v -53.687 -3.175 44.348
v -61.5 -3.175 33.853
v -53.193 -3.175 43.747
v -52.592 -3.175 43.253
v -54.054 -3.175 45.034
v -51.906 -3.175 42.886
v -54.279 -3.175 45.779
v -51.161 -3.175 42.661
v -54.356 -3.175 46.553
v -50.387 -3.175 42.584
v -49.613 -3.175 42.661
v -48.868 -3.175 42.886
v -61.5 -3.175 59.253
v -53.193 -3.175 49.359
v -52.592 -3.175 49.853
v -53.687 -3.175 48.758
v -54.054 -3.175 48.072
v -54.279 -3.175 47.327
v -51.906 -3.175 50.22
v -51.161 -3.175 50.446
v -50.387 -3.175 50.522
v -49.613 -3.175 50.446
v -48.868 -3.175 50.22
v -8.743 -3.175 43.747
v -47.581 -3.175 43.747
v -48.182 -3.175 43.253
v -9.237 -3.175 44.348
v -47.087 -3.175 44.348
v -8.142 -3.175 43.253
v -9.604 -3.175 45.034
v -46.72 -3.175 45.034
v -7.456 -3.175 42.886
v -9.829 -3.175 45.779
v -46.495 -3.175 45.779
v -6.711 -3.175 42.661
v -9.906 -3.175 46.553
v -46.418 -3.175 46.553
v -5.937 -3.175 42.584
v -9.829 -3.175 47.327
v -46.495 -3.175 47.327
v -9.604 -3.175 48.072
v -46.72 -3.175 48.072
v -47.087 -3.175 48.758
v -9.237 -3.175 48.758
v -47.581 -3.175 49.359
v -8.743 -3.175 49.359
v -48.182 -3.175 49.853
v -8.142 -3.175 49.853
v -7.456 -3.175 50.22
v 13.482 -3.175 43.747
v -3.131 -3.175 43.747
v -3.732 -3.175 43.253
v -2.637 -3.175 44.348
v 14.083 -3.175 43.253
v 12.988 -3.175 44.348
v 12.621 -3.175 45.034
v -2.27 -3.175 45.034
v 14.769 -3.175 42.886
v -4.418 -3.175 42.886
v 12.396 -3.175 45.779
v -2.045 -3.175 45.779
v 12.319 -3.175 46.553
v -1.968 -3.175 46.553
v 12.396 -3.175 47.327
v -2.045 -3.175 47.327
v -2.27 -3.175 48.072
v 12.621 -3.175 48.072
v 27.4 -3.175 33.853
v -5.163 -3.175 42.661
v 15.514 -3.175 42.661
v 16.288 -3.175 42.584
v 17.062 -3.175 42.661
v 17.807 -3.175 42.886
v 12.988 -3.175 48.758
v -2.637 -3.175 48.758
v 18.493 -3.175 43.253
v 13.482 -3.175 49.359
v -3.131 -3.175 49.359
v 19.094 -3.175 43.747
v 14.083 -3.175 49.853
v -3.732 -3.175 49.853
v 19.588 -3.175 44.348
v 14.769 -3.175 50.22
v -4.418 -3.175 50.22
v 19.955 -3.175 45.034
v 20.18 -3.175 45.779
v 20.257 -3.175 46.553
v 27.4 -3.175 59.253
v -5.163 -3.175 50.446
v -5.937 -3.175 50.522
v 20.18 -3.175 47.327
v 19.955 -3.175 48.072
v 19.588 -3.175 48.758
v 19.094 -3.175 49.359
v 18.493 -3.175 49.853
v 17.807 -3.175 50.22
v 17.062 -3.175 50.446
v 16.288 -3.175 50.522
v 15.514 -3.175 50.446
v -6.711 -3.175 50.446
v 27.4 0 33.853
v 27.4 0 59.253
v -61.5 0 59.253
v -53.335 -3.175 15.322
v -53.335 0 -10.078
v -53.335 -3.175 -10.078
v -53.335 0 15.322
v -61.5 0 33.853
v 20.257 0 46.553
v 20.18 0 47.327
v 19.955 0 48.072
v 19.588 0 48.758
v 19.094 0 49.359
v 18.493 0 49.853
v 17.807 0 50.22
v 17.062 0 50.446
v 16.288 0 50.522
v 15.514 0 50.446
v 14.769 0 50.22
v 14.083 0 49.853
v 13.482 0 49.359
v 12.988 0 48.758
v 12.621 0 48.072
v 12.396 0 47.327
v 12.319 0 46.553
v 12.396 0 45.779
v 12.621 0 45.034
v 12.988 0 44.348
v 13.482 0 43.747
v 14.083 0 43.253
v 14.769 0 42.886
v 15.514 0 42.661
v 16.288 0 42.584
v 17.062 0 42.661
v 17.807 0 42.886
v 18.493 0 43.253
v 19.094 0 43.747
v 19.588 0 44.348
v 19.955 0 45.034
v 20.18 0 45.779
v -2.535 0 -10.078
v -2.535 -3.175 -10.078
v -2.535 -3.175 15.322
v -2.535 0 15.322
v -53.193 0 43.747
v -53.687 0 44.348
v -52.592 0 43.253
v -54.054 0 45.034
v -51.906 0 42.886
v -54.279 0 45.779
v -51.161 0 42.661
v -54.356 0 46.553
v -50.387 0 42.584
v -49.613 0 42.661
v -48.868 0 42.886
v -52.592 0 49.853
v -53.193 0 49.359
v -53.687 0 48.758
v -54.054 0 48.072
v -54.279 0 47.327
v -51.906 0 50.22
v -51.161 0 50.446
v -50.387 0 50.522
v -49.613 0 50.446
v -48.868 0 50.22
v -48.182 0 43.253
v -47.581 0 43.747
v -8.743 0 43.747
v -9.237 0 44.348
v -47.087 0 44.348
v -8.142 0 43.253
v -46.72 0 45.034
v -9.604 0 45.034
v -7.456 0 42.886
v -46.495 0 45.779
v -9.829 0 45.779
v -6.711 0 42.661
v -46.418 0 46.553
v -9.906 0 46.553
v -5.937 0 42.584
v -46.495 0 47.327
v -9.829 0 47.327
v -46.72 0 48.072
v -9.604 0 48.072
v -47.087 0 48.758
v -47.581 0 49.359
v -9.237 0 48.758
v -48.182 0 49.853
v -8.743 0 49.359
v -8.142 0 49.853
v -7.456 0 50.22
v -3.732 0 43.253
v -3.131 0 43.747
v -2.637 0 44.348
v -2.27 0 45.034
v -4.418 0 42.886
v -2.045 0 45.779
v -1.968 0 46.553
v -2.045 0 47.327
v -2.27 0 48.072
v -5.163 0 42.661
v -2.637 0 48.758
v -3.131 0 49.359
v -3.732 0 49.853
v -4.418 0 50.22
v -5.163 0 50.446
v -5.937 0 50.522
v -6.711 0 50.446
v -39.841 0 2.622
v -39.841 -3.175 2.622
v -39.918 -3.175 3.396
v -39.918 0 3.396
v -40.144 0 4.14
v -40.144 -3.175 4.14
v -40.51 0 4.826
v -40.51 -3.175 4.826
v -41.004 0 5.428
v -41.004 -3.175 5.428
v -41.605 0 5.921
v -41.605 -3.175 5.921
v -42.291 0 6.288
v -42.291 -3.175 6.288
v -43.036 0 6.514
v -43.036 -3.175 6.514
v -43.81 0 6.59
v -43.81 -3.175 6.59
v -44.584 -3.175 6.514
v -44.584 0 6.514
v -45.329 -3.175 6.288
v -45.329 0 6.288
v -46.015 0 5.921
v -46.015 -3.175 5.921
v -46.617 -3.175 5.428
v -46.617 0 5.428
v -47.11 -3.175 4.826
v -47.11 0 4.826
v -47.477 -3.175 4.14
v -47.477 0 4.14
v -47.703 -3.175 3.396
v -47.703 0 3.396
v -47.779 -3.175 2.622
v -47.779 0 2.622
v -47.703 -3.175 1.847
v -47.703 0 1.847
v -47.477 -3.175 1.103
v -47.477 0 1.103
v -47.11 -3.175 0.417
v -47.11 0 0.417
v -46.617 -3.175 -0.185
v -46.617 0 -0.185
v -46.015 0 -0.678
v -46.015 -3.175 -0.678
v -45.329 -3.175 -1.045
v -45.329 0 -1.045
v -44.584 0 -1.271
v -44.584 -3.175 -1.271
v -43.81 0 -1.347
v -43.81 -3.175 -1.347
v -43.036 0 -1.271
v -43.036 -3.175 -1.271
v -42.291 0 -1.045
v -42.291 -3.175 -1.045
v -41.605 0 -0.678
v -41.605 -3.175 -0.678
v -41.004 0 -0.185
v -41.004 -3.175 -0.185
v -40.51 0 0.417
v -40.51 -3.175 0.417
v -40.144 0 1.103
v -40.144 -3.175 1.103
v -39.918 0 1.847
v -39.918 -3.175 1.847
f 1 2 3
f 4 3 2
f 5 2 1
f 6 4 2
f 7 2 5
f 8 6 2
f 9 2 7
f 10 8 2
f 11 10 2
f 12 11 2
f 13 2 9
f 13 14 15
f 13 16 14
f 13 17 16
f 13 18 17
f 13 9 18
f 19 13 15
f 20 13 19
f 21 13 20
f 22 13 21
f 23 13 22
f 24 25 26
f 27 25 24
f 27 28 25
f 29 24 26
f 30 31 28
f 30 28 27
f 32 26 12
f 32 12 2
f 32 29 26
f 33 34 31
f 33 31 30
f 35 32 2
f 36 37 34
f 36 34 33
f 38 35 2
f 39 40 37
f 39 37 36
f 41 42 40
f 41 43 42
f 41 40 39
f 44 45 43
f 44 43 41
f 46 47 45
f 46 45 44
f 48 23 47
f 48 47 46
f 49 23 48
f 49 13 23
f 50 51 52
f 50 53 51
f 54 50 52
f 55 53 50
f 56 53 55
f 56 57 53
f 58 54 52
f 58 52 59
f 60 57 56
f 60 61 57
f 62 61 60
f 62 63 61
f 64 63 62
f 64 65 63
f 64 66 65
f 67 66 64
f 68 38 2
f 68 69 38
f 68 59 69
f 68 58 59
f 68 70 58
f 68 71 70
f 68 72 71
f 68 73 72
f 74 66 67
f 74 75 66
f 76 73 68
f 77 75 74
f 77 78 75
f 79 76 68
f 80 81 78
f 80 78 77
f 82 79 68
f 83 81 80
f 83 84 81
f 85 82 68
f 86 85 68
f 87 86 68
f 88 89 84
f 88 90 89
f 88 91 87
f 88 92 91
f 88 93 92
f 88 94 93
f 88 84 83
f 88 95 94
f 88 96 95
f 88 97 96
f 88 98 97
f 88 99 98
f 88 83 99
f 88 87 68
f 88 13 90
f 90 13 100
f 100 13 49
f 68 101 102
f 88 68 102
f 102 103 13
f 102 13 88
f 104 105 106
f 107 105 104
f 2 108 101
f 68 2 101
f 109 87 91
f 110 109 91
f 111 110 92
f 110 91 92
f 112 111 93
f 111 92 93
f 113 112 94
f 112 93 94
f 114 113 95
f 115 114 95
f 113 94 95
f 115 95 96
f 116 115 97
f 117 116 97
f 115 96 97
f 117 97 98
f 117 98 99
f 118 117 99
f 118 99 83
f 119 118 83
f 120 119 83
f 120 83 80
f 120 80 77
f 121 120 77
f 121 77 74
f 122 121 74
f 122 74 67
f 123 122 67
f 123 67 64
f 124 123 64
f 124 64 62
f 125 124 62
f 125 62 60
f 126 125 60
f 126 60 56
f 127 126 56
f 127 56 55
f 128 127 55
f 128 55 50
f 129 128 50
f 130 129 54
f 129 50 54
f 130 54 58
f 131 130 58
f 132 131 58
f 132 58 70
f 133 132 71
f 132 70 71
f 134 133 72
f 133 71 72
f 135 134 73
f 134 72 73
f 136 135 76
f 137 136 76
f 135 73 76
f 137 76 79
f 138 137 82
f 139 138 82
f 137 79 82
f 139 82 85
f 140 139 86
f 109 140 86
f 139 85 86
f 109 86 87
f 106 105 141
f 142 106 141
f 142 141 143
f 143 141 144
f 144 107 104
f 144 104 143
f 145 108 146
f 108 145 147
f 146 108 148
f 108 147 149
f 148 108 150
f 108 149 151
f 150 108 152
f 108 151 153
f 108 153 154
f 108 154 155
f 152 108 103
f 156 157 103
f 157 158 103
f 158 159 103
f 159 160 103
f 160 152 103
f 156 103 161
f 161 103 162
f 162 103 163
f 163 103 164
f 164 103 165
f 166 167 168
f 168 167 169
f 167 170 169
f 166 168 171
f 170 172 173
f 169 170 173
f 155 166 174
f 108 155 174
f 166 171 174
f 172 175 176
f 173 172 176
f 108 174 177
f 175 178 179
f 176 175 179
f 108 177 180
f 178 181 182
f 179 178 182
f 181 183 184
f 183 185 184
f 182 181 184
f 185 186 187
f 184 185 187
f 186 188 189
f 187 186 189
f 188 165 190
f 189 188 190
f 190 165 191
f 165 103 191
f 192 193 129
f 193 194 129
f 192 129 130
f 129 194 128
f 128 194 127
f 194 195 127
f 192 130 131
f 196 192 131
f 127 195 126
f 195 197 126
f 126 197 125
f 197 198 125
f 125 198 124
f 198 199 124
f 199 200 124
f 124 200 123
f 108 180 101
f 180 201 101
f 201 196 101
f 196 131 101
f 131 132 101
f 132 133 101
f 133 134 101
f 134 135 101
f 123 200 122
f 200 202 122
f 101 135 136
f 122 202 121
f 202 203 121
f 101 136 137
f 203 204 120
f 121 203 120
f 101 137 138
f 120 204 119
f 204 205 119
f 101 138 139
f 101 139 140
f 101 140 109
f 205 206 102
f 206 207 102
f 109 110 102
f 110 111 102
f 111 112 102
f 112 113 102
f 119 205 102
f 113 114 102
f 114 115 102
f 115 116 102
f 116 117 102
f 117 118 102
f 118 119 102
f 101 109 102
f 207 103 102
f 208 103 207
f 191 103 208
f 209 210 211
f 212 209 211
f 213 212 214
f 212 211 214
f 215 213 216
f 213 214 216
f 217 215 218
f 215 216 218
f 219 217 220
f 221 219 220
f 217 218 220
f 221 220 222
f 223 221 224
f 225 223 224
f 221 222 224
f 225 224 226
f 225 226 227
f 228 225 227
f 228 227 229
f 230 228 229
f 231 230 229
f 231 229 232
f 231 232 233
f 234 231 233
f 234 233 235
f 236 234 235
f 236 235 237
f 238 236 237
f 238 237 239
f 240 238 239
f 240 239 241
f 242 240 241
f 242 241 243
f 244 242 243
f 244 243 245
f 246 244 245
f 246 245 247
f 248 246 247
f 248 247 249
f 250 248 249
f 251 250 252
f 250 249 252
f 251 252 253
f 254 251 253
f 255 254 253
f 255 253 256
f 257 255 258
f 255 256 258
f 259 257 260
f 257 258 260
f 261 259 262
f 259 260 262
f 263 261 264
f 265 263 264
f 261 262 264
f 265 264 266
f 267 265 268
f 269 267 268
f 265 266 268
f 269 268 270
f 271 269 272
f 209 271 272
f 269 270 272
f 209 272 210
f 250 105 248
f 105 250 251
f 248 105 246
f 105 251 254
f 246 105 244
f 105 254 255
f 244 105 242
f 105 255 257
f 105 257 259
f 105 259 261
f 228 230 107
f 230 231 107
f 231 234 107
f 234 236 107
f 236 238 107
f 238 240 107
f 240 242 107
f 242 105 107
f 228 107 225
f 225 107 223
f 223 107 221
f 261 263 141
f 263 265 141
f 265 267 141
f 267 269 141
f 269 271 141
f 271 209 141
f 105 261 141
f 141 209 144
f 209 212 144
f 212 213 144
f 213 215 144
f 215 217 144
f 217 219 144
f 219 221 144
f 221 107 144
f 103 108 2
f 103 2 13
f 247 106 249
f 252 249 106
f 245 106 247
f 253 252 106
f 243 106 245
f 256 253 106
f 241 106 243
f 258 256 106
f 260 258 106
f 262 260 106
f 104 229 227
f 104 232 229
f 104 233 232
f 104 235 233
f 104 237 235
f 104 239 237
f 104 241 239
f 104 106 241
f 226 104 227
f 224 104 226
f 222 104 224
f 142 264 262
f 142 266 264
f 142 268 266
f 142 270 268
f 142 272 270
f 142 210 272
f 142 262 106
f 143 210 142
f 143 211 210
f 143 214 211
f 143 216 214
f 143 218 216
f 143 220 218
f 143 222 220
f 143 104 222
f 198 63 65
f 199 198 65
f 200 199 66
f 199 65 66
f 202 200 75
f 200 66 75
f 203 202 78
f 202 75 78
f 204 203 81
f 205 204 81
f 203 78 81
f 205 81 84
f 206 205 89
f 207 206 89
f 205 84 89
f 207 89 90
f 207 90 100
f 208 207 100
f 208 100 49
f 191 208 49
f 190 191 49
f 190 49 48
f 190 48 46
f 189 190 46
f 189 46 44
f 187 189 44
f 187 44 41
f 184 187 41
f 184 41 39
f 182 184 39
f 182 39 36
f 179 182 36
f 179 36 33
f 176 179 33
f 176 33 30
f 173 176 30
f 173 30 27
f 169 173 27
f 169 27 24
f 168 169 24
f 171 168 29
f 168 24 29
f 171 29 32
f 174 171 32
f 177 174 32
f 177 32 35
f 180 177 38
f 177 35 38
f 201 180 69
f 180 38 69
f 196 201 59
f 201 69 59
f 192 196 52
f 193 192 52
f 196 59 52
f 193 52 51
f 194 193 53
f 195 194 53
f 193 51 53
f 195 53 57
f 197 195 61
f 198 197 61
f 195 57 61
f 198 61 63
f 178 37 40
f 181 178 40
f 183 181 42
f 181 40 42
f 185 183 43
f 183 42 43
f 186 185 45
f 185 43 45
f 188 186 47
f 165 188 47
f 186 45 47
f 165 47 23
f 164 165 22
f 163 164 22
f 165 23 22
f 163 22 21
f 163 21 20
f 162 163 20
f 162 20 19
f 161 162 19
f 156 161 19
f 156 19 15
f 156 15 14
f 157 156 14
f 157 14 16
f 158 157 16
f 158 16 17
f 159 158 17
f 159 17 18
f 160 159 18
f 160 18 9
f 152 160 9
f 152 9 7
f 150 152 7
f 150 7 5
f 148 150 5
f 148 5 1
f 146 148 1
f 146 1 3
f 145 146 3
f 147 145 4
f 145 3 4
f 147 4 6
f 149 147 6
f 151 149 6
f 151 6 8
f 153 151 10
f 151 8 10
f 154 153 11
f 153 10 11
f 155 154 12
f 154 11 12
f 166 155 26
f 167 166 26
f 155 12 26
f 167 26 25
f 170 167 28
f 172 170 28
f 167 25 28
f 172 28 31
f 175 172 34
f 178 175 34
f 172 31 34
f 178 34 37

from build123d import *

# Parameters (mm, degrees)
F0_W     = 88.9
F0_H     = 25.4
F1_DEPTH = 3.175
F0_W_2   = 50.8
F2_R     = 3.96875
F3_DEPTH = 3.176


# Not quite as in the source:
# - a feature names something its author has since deleted; it is built from what else it names


with BuildPart() as f1:
    # F0 (on Front) → F1 (new body)
    with BuildSketch(Plane.XZ):
        with Locations((-17.0495061394, 46.5531354078)):
            Rectangle(F0_W, F0_H)
    extrude(amount=F1_DEPTH)


with BuildPart() as f1b:
    # F0 (on Front) → F1, piece 2 (new body)
    with BuildSketch(Plane.XZ):
        with Locations((-27.9352209627, 2.6215043573)):
            Rectangle(F0_W_2, F0_H)
    extrude(amount=F1_DEPTH)


with BuildPart() as f3_tool:
    # F2 (on face) → F3 (new body, through all)
    with BuildSketch(Plane.XZ.offset(3.175)):
        with Locations((-50.3870061394, 46.5531354078)):
            Circle(F2_R)
        with Locations((-43.8102209627, 2.6215043573)):
            Circle(F2_R)
        with Locations((-5.9370061394, 46.5531354078)):
            Circle(F2_R)
        with Locations((16.2879938606, 46.5531354078)):
            Circle(F2_R)
    extrude(amount=-F3_DEPTH)


with BuildPart() as f1_1:
    add(f1.part)

    # F3: cut by f3_tool
    add(f3_tool.part, mode=Mode.SUBTRACT)


with BuildPart() as f1b_1:
    add(f1b.part)

    # F3: cut by f3_tool
    add(f3_tool.part, mode=Mode.SUBTRACT)


solid = Compound([f1_1.part, f1b_1.part])
